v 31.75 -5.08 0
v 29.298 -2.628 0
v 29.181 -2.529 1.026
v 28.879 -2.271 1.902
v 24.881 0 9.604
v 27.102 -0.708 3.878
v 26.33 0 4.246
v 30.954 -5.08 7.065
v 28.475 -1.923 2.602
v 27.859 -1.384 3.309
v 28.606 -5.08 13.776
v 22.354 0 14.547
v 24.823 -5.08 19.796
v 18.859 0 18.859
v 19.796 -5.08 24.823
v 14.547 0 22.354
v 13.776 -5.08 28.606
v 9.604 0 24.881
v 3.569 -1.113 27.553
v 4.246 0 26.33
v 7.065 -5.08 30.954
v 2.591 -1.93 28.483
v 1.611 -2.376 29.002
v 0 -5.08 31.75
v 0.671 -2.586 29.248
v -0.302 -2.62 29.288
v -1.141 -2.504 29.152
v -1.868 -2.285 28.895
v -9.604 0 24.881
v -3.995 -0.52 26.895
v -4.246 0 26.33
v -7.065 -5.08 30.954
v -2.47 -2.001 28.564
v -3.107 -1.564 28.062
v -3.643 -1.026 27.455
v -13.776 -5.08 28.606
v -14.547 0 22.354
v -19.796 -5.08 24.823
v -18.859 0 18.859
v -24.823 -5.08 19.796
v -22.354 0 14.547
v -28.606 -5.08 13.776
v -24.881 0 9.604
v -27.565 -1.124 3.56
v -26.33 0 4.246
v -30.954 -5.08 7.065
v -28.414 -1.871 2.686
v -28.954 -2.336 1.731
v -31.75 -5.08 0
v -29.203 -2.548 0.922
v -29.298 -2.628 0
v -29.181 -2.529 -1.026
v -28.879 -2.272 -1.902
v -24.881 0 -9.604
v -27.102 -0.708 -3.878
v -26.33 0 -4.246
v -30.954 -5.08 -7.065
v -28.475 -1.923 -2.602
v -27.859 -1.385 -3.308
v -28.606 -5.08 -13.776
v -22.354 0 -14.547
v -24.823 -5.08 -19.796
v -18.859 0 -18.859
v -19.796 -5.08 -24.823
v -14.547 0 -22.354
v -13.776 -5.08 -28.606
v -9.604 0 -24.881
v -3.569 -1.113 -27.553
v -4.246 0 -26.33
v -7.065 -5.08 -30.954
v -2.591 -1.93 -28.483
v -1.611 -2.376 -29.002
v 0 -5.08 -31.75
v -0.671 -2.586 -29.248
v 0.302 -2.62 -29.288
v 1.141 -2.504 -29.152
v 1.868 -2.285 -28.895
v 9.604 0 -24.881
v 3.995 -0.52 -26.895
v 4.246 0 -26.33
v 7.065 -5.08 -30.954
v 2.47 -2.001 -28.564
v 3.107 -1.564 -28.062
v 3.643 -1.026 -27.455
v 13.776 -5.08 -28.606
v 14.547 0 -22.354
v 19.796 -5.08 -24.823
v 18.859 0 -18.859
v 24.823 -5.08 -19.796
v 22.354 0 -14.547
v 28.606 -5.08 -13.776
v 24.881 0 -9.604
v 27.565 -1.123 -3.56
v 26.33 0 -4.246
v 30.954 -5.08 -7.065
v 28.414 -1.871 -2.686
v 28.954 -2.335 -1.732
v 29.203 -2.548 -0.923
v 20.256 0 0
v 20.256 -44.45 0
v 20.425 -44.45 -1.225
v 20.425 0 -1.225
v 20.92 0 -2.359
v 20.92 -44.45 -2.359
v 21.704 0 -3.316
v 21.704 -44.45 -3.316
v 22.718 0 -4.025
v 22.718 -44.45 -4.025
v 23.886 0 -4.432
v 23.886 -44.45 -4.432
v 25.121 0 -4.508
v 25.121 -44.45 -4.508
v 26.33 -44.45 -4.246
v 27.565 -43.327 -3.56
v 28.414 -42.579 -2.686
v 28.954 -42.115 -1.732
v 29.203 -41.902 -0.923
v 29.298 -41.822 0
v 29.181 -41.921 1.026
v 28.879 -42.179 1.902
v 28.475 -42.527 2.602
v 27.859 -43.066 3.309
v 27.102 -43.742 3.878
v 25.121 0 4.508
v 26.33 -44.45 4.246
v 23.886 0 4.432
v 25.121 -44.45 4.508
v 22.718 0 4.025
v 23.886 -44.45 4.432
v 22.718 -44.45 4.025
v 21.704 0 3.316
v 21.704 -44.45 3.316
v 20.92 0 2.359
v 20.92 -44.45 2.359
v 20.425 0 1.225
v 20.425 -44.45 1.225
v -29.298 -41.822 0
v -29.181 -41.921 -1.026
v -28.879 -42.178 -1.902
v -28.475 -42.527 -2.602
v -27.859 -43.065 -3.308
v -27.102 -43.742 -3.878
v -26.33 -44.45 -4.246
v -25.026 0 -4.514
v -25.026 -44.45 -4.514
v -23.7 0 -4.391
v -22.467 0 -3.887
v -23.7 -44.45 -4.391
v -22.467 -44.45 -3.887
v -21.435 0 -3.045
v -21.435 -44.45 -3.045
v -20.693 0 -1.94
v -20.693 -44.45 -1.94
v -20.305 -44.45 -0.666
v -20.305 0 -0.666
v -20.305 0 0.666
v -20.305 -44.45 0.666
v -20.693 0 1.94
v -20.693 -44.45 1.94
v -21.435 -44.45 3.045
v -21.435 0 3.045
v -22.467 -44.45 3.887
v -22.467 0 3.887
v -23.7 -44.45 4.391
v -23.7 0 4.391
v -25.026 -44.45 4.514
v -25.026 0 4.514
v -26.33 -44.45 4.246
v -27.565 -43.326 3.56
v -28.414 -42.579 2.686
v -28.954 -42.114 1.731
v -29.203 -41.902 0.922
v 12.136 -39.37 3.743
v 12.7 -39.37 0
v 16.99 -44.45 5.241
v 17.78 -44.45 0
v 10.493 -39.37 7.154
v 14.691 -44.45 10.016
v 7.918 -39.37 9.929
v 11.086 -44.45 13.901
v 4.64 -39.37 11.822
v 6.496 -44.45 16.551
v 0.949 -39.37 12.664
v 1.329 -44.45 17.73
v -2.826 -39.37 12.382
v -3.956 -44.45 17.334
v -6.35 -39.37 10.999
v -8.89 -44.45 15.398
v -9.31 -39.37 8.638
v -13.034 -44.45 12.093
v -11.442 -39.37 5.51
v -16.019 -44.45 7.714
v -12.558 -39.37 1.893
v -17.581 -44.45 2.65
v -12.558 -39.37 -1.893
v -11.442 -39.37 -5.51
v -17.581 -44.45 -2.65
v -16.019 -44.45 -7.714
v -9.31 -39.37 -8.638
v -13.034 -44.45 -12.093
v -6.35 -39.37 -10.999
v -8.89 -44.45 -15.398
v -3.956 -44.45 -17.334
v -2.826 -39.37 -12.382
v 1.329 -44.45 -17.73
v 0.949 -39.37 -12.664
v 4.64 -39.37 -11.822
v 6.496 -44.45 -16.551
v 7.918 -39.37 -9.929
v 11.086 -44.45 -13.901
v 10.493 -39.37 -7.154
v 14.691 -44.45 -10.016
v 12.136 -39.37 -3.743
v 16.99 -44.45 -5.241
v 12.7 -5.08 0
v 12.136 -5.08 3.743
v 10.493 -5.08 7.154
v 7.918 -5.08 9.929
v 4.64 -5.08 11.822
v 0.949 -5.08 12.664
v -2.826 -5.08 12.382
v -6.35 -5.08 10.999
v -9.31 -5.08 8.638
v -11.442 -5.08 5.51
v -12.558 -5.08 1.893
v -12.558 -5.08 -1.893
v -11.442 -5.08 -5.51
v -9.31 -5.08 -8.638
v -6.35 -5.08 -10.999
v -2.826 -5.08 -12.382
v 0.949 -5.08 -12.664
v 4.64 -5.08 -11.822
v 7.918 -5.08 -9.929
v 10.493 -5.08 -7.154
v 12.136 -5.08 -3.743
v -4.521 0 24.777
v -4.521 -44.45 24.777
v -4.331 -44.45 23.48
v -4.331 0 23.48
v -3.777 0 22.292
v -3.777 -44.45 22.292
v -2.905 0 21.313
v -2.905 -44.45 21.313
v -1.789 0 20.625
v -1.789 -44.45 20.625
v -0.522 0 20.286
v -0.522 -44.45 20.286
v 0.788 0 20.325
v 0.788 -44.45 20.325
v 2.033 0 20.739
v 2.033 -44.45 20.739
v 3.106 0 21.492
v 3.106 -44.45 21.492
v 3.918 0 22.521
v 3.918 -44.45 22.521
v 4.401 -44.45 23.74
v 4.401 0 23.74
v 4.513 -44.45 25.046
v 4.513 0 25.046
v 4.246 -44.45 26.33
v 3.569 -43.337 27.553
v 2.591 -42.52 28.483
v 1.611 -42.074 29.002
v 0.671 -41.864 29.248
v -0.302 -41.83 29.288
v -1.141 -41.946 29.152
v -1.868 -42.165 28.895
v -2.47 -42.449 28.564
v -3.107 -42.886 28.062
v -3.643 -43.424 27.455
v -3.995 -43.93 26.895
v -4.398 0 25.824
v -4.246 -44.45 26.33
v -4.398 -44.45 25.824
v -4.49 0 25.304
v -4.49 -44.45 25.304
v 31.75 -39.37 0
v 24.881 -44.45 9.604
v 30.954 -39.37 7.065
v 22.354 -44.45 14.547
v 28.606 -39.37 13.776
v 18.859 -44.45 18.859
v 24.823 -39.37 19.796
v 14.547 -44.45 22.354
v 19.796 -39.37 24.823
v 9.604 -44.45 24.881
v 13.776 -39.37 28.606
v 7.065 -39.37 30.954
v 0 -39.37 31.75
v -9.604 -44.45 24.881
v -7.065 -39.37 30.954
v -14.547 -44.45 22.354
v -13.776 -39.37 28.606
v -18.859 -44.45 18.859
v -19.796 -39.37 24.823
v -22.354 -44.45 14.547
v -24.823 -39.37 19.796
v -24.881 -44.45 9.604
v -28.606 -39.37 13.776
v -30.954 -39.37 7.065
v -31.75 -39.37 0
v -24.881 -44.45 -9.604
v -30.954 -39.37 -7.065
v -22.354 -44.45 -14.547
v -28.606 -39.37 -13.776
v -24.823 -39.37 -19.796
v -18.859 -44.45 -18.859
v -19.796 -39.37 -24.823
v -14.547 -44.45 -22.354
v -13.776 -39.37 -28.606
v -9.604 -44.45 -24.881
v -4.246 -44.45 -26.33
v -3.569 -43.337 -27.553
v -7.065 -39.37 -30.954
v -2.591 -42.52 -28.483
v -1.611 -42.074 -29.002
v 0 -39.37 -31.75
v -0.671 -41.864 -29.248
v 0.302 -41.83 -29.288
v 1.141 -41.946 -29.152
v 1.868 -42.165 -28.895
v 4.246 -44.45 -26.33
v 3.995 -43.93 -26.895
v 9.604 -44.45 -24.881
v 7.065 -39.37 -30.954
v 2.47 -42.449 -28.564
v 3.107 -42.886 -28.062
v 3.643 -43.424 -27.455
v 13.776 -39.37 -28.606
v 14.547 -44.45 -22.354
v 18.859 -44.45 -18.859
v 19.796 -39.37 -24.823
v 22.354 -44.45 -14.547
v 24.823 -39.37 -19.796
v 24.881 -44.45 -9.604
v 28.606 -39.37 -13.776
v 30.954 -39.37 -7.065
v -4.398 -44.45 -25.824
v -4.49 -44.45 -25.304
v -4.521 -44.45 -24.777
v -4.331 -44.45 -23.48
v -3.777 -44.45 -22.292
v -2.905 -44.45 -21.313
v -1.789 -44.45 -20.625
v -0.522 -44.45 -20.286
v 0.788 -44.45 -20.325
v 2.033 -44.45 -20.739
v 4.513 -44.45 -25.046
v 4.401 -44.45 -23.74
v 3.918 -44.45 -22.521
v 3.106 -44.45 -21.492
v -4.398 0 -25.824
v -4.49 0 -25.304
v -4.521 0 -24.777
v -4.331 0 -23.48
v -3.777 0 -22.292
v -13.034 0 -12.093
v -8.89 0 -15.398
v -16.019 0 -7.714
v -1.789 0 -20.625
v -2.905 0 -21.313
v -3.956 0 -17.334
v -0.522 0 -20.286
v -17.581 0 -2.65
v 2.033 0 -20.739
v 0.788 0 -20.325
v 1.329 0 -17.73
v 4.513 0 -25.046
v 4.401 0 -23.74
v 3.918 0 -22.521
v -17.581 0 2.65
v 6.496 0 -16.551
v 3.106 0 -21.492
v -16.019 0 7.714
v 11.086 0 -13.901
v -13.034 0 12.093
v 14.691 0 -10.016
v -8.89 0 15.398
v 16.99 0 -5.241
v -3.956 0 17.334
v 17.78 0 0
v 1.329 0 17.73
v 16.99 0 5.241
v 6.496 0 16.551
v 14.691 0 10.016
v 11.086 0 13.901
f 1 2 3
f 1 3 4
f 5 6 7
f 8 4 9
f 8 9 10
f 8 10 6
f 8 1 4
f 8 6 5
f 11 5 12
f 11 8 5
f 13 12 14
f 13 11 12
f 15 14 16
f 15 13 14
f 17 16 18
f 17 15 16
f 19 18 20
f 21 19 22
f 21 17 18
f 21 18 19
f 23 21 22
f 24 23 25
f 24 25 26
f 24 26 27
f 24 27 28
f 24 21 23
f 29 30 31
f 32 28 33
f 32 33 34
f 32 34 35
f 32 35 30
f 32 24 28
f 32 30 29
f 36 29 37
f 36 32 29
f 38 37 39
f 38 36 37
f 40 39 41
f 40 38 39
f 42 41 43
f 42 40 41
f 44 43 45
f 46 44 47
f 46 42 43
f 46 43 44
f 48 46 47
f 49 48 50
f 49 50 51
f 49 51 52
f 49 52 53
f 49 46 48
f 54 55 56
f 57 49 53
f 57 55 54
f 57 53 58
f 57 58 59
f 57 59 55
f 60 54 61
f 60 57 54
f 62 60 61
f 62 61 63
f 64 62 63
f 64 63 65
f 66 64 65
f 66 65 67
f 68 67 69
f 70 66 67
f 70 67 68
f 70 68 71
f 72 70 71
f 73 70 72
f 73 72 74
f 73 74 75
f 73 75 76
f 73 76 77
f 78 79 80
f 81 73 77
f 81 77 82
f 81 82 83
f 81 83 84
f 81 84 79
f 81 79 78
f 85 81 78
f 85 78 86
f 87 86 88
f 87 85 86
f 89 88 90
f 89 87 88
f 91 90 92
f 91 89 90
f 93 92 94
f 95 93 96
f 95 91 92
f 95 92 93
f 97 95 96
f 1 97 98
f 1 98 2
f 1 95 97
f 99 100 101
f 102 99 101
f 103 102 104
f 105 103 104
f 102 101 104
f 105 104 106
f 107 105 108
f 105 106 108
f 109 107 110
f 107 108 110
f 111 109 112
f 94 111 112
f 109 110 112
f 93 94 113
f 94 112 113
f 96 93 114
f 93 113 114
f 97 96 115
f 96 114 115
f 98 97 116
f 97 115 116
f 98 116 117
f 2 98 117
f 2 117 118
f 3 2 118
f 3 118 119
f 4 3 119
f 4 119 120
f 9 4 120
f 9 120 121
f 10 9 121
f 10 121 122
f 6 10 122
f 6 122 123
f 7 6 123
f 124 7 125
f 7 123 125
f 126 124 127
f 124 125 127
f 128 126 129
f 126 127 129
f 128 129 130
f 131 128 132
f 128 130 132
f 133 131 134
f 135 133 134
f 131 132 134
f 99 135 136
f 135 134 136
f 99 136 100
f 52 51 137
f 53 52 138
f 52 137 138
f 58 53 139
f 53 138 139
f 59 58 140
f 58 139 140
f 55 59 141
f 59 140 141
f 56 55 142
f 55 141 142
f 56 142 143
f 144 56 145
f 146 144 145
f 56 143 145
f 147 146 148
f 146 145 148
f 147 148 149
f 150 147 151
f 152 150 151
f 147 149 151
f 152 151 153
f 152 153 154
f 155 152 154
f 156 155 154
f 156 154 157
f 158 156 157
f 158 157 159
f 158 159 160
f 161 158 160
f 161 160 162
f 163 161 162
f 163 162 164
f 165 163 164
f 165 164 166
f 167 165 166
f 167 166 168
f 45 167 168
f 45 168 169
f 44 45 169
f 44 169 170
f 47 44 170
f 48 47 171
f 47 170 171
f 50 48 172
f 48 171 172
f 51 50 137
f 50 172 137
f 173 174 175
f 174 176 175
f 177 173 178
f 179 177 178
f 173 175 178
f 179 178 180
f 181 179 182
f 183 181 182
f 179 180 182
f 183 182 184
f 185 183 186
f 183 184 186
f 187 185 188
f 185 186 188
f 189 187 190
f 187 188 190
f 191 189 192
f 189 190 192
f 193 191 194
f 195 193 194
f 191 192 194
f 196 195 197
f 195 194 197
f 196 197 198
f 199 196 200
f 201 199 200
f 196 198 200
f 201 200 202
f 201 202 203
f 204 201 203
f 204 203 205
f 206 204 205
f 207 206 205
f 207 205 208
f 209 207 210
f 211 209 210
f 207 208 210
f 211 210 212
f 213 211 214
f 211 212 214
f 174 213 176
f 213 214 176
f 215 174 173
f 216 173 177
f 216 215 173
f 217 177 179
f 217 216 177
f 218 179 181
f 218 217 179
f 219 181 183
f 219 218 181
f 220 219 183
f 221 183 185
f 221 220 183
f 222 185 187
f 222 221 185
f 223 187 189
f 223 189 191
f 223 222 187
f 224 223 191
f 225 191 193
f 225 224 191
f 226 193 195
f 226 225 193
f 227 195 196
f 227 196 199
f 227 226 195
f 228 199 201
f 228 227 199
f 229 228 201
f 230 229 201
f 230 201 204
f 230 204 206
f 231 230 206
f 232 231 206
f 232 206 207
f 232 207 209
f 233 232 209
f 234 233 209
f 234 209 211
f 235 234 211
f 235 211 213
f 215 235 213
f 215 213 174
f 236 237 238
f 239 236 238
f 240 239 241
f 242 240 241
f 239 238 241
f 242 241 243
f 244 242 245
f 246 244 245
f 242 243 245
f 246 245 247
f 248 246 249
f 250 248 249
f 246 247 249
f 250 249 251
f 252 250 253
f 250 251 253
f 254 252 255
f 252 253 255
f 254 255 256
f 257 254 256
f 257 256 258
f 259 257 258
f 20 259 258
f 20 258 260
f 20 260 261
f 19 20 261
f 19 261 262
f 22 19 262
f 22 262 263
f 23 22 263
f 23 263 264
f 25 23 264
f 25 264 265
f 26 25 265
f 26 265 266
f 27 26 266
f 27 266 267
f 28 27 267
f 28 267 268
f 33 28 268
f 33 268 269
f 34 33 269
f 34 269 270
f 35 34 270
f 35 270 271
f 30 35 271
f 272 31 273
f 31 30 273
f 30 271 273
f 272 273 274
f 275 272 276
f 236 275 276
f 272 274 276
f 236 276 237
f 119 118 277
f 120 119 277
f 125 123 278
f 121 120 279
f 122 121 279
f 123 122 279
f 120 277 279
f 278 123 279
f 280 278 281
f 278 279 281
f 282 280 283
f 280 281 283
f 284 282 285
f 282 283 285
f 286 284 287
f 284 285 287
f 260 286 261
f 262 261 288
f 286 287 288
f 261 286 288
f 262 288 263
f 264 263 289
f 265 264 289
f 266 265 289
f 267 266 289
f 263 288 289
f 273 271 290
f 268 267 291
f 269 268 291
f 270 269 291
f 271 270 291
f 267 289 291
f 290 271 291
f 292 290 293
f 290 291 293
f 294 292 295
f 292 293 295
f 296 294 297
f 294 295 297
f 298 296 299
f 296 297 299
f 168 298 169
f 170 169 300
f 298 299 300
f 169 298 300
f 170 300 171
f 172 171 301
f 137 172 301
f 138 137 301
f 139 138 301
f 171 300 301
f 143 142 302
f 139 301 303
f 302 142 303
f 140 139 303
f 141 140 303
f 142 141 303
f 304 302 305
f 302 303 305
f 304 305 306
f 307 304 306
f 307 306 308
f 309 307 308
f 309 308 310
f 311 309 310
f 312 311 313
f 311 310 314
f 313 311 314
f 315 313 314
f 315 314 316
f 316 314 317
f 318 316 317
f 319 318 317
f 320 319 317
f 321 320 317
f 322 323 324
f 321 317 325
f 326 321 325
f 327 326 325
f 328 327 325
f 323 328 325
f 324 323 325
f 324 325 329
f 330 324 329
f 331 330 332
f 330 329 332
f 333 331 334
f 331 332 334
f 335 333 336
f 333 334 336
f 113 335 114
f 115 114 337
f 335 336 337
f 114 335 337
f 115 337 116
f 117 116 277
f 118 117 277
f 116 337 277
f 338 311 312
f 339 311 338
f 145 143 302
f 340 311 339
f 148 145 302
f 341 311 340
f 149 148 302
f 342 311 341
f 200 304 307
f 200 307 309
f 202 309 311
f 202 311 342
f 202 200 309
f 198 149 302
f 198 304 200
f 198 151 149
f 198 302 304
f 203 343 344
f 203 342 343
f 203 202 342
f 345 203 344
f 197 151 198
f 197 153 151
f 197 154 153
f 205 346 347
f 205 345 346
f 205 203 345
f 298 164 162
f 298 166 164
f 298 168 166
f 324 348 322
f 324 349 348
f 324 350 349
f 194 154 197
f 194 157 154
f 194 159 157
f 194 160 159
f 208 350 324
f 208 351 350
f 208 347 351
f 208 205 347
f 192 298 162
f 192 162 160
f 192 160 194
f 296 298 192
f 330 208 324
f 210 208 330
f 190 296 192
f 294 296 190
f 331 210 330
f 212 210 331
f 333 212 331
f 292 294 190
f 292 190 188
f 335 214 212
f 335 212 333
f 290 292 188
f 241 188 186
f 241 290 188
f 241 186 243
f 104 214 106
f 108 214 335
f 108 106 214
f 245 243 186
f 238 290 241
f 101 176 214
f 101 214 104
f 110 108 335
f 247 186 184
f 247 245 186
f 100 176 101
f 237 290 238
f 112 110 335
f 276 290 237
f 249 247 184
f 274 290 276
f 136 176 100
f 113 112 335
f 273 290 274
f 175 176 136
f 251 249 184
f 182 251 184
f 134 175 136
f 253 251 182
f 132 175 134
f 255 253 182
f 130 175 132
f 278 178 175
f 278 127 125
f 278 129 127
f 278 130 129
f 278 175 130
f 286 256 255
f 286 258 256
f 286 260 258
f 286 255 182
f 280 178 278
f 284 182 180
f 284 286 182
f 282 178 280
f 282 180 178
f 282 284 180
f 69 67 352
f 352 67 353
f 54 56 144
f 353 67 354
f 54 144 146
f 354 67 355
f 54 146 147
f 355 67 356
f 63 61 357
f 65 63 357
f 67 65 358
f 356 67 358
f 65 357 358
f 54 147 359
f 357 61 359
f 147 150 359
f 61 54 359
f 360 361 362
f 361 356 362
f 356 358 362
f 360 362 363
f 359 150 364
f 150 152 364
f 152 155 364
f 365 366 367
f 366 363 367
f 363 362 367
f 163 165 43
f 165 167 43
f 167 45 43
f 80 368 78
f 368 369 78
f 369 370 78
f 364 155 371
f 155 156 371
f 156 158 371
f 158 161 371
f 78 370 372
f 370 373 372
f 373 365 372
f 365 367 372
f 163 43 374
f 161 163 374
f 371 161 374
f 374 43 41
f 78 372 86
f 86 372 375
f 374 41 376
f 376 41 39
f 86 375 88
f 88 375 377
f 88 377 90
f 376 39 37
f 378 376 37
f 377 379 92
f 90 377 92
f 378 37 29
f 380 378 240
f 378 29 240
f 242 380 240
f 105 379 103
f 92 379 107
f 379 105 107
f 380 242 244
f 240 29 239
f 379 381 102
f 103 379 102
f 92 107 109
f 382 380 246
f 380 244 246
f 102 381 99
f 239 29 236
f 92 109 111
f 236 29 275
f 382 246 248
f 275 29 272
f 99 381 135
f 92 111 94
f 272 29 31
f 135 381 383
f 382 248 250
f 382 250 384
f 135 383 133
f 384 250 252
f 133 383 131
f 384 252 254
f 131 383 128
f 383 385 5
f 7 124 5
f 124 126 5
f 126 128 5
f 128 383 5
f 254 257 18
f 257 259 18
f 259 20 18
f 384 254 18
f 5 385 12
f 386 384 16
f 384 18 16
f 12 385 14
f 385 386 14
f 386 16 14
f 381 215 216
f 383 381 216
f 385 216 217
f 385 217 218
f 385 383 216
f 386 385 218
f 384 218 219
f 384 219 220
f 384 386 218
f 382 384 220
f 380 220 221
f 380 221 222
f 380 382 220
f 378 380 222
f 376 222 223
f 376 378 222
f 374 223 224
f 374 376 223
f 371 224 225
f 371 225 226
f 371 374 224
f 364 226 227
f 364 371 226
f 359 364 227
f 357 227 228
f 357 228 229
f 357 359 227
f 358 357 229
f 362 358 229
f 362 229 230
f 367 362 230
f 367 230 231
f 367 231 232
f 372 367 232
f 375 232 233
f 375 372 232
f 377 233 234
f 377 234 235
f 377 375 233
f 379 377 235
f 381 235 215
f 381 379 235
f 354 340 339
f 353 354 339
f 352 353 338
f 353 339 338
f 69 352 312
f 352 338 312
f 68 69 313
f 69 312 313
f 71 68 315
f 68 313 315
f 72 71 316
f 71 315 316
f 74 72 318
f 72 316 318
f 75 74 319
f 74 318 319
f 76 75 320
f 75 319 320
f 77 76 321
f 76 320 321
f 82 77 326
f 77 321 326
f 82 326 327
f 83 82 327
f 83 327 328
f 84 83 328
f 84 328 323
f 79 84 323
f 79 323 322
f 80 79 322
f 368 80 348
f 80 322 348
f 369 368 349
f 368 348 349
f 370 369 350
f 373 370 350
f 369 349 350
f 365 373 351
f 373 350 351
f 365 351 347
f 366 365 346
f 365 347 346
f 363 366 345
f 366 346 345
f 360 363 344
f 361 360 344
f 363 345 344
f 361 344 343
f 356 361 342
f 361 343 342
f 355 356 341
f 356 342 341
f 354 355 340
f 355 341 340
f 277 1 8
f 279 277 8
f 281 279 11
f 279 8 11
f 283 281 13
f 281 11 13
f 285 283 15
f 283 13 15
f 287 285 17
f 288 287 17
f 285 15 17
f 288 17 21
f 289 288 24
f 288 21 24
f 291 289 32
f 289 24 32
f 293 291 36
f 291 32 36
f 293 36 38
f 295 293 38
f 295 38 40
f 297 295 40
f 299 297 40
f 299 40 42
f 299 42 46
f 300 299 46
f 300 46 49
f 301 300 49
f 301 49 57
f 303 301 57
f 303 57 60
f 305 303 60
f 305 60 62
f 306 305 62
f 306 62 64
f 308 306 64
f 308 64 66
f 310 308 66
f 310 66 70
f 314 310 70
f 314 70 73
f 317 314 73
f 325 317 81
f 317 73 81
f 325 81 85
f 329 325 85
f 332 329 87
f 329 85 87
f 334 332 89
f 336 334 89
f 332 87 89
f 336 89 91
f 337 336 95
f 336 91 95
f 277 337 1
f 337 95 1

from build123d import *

# Parameters (mm, degrees)
F0_R     = 31.75
F0_R_2   = 24.7772994978
F0_R_3   = 19.1989713068
F0_R_4   = 12.7
F1_DEPTH = 44.45
F2_D     = 9.0424


# Not quite as in the source:
# - a fillet or chamfer that OpenCascade refuses, or shapes differently, is made with other operations: its cross-section is extruded or revolved along the edge and cut away or added


with BuildPart() as f1:
    # F0 (on Front) → F1 (new body)
    with BuildSketch(Plane.XZ):
        Circle(F0_R)
        Circle(F0_R_2, mode=Mode.SUBTRACT)
        Circle(F0_R_2)
        Circle(F0_R_3, mode=Mode.SUBTRACT)
        Circle(F0_R_3)
        Circle(F0_R_4, mode=Mode.SUBTRACT)
    extrude(amount=F1_DEPTH)

    # F2 (through all)
    with Locations(Plane(origin=(0, 0, 0), x_dir=(1, 0, 0), z_dir=(0, 1, 0))):
        with Locations((24.7772994978, 0), (0, 24.7772994978), (-24.7772994978, 0), (0, -24.7772994978)):
            Hole(F2_D / 2)

    # F3: chamfer of 5.08 on 4 edges, made by hand

    # F3_s1 → F3_t2 (revolve, cut)
    with BuildSketch(Plane.XY):
        Polygon((12.7, -39.37), (17.78, -44.45), (12.7, -44.45), align=None)
    revolve(axis=Axis((0, -44.45, 0), (0, -1, 0)), mode=Mode.SUBTRACT)

    # F3_s3 → F3_t4 (revolve, cut)
    with BuildSketch(Plane.XY):
        Polygon((26.67, -44.45), (31.75, -39.37), (31.75, -44.45), align=None)
    revolve(axis=Axis((0, -44.45, 0), (0, -1, 0)), mode=Mode.SUBTRACT)

    # F3_s5 → F3_t6 (revolve, cut)
    with BuildSketch(Plane.XY):
        Polygon((12.7, -5.08), (17.78, 0), (12.7, 0), align=None)
    revolve(axis=Axis((0, 0, 0), (0, -1, 0)), mode=Mode.SUBTRACT)

    # F3_s7 → F3_t8 (revolve, cut)
    with BuildSketch(Plane.XY):
        Polygon((26.67, 0), (31.75, -5.08), (31.75, 0), align=None)
    revolve(axis=Axis((0, 0, 0), (0, -1, 0)), mode=Mode.SUBTRACT)


solid = f1.part
